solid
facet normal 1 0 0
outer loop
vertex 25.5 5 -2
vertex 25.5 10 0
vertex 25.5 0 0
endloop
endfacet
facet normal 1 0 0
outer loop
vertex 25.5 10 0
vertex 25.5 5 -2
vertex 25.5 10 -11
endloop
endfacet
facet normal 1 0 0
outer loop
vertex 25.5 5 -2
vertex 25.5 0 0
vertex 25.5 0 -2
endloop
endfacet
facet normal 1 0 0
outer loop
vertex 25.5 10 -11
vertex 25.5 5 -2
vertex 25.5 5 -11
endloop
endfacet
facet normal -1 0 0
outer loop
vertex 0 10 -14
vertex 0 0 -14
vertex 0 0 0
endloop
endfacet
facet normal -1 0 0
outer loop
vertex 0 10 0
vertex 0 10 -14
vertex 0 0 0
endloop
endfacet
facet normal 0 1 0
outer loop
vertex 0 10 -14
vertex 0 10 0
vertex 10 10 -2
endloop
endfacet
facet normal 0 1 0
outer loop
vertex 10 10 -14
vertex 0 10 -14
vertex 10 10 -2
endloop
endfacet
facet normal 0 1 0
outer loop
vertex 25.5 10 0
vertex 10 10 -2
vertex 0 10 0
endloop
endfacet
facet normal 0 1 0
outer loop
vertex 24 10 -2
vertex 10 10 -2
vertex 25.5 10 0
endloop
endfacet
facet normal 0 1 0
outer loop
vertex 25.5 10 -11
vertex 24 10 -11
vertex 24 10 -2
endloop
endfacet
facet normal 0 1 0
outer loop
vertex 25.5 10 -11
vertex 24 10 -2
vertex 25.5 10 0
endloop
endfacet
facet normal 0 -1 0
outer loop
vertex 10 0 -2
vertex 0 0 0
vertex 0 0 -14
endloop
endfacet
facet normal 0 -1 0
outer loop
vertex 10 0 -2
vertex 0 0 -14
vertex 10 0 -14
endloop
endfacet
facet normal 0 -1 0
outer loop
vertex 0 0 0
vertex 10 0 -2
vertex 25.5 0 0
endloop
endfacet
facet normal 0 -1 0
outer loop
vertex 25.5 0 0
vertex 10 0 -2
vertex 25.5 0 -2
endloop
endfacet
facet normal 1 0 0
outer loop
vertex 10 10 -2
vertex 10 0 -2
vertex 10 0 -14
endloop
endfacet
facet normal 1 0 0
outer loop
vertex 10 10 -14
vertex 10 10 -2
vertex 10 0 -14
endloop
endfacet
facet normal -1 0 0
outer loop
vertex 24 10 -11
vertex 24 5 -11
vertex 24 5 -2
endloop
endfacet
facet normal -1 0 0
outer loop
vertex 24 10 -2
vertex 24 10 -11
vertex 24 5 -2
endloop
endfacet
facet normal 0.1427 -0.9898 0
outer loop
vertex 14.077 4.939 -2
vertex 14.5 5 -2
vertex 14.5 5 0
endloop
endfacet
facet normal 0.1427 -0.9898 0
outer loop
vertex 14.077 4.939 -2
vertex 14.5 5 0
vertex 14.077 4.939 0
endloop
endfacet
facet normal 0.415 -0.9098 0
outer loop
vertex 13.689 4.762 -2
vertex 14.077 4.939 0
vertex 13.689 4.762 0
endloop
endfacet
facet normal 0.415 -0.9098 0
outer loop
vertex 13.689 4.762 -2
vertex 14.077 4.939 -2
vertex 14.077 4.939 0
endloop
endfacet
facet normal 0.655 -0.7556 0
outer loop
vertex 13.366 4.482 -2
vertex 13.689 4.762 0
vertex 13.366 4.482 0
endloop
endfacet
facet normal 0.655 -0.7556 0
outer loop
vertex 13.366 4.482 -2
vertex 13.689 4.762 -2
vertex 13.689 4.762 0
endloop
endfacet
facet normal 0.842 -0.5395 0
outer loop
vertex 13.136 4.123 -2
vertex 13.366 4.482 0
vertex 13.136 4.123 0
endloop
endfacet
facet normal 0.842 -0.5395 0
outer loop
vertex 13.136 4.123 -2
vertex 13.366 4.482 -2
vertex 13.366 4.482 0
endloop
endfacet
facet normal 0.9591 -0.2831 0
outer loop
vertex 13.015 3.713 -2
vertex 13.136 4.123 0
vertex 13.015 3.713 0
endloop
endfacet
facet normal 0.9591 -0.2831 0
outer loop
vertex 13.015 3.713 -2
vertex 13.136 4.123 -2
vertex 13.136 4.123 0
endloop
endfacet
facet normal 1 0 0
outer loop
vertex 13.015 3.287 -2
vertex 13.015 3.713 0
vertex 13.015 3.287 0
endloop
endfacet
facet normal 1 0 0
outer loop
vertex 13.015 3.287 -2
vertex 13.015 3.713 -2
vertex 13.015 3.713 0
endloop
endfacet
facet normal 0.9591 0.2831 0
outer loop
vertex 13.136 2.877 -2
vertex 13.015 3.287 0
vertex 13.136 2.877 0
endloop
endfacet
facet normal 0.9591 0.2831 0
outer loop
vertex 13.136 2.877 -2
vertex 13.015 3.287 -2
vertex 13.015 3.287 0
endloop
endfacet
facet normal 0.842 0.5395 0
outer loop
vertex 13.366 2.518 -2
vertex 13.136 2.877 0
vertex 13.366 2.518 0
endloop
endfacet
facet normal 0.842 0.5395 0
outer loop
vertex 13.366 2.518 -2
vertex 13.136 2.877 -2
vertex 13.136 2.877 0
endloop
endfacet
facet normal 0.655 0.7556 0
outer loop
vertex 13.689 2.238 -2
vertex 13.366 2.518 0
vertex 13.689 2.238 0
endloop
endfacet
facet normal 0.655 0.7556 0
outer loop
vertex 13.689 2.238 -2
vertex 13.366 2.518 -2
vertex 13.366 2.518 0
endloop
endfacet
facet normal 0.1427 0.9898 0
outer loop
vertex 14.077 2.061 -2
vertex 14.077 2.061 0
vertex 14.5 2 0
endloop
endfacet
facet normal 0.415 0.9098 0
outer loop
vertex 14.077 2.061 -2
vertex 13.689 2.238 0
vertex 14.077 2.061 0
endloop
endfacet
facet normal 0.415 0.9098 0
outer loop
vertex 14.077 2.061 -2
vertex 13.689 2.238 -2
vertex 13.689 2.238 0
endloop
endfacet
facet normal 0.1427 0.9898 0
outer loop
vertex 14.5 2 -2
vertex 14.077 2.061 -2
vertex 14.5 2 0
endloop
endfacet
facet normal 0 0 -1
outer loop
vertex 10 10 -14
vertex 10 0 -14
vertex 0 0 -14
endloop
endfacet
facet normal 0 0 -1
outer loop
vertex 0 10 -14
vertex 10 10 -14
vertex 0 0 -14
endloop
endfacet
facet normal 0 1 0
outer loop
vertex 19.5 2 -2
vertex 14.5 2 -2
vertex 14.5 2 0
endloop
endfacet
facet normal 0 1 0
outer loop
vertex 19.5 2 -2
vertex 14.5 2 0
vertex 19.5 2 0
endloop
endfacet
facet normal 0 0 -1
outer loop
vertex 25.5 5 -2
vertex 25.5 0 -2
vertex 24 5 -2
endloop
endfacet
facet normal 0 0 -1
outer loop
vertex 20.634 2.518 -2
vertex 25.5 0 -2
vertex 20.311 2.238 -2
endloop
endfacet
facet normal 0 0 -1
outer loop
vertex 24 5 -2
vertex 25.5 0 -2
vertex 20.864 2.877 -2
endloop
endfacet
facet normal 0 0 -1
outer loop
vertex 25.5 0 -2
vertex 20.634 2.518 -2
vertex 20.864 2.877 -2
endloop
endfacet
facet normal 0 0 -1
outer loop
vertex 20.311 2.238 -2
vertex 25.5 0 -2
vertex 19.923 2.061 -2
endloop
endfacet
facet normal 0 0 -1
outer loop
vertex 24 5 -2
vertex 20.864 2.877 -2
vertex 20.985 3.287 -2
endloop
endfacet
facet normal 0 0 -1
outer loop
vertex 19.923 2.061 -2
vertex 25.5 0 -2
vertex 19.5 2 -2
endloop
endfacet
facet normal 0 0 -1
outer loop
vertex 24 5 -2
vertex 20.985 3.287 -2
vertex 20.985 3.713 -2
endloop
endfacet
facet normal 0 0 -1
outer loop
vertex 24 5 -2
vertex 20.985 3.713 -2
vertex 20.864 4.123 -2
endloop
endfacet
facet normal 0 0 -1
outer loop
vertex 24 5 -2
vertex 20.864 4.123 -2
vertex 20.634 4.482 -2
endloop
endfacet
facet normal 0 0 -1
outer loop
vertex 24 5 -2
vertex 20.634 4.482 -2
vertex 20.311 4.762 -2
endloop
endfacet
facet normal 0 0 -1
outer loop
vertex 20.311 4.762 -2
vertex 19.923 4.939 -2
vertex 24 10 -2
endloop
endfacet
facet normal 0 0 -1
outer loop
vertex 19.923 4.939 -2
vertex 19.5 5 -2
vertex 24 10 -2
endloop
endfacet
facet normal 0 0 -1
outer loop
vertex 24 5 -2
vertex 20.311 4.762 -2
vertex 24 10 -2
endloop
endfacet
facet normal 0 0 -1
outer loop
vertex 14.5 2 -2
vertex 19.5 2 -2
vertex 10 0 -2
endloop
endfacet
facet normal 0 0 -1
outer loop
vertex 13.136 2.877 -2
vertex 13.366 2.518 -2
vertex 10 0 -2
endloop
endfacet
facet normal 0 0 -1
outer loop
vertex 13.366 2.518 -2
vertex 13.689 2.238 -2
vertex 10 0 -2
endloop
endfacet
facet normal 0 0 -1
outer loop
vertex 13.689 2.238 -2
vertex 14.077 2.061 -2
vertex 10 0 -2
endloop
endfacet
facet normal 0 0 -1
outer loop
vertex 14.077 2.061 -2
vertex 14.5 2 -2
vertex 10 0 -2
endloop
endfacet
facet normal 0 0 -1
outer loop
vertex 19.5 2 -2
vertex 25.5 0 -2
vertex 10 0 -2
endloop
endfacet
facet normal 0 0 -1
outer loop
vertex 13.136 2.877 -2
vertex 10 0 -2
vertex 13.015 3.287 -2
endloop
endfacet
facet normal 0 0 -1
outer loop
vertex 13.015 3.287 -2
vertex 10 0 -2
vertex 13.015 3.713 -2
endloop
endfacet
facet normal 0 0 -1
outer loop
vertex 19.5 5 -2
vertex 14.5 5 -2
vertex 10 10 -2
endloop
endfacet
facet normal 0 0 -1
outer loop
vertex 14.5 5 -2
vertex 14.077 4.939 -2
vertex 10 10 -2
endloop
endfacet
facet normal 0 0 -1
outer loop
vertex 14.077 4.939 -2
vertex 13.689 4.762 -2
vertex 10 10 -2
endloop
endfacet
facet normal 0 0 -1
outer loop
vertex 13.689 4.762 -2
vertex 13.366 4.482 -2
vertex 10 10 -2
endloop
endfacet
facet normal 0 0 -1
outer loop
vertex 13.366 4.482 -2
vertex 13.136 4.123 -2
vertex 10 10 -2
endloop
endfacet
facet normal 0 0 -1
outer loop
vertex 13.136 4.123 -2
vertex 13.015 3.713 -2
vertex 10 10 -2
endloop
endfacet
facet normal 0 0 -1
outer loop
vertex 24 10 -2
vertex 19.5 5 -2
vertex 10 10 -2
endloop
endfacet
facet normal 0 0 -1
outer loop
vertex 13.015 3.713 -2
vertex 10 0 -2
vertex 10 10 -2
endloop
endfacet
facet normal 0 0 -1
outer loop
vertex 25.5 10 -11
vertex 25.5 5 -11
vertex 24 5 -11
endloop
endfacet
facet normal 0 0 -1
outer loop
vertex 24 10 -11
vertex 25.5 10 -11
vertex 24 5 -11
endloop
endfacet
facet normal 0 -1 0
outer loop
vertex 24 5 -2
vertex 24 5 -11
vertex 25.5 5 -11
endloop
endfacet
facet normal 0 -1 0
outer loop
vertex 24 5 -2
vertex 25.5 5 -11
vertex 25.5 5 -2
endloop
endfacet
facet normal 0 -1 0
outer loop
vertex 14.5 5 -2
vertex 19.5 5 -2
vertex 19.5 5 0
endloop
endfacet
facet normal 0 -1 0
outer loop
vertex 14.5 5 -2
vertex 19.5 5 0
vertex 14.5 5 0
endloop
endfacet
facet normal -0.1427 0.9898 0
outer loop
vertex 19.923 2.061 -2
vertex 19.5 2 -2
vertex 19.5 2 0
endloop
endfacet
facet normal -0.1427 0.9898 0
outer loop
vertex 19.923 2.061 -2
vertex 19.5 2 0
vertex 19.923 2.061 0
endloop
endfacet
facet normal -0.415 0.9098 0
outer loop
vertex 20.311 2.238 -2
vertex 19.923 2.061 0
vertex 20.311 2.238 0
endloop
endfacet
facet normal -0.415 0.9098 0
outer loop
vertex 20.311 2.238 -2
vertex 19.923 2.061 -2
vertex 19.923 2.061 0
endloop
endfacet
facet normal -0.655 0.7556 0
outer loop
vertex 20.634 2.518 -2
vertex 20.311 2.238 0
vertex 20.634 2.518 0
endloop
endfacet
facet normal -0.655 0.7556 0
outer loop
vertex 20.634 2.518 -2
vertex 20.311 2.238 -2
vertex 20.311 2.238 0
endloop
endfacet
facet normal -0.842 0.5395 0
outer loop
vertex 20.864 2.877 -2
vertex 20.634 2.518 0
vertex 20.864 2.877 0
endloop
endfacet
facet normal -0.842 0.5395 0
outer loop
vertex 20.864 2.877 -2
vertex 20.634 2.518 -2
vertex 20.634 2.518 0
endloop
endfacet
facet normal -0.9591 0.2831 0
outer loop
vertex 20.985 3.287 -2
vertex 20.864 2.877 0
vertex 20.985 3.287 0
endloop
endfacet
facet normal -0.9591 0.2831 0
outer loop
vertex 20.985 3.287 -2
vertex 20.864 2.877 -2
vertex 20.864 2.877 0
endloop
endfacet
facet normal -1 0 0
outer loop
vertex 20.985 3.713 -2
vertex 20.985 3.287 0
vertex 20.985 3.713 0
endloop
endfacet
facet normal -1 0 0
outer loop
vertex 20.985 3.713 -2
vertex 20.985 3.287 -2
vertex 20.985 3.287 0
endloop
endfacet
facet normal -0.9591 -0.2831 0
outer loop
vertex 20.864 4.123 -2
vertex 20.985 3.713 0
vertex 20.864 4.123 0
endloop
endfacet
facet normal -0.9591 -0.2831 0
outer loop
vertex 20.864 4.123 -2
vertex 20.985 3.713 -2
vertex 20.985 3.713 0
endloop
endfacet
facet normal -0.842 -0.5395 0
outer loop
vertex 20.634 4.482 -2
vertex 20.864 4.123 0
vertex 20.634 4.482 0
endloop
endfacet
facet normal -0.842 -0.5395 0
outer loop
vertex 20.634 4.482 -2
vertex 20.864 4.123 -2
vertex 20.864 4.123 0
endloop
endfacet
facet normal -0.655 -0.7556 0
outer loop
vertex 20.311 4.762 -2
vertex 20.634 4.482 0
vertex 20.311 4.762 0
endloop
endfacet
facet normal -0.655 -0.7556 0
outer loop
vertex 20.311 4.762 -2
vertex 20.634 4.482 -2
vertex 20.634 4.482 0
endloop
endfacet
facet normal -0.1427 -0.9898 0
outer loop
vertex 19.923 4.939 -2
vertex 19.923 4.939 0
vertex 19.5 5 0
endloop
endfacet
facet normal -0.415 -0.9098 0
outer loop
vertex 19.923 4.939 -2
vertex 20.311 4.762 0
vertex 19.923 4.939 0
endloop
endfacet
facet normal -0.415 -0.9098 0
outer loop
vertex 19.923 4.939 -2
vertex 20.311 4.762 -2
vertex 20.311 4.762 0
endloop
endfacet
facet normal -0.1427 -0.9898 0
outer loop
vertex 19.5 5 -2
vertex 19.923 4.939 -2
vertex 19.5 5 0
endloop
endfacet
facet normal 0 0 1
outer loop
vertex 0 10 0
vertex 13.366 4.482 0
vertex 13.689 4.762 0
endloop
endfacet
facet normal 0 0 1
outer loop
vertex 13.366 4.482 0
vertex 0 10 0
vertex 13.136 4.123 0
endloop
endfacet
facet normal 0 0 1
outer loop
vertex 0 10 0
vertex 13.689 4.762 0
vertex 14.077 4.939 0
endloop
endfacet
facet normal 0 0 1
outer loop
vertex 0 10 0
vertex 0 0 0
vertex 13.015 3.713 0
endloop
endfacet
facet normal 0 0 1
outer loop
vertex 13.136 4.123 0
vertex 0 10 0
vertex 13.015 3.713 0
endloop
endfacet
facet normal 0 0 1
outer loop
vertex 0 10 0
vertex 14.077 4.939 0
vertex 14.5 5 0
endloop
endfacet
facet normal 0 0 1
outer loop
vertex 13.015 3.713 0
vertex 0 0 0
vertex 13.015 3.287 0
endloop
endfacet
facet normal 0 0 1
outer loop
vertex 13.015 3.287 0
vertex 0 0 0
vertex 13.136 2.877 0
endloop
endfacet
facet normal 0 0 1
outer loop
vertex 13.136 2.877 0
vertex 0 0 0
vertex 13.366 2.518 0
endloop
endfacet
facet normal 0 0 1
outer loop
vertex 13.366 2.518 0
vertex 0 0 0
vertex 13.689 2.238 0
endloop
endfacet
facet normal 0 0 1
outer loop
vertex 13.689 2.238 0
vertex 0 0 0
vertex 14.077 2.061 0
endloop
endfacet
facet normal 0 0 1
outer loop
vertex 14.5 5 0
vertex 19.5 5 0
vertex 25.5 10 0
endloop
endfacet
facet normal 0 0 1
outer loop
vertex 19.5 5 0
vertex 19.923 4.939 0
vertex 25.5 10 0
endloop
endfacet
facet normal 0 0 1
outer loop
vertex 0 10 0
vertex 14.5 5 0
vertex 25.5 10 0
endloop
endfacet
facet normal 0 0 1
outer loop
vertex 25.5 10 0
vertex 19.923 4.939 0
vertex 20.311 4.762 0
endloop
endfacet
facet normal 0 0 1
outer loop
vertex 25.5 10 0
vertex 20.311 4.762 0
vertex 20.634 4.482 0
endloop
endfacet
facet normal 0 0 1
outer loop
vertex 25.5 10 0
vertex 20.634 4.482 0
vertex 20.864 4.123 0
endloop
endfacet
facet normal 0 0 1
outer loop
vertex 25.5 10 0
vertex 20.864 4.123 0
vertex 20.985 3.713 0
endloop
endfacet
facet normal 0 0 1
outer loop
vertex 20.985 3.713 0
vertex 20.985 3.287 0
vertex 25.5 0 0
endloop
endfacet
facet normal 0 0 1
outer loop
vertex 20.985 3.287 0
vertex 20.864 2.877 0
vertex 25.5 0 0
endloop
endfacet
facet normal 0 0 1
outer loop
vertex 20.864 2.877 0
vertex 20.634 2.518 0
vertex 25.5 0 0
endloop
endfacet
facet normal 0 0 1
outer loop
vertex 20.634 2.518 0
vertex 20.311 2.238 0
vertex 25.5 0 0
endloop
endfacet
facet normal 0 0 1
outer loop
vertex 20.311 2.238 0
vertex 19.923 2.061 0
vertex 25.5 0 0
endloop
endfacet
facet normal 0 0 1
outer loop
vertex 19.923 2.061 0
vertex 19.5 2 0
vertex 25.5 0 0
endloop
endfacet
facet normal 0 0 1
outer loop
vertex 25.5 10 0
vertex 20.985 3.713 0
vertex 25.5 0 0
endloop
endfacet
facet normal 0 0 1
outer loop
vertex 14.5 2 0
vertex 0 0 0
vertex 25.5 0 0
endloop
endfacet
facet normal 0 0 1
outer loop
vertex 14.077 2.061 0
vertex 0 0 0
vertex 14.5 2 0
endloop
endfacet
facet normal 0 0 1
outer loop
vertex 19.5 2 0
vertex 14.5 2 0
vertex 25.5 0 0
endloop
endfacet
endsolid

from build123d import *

# Parameters (mm, degrees)
BOSS_EXTRUDE1_DEPTH = 10
CUT_EXTRUDE1_REACH  = 3.5
SKETCH2_W           = 9
SKETCH2_H           = 5
CUT_EXTRUDE2_REACH  = 4


with BuildPart() as part:
    # Sketch1 → Boss-Extrude1 (new body)
    with BuildSketch(Plane(origin=(0, 0, 0), x_dir=(1, 0, 0), z_dir=(0, 1, 0))):
        Polygon((0, 0), (25.5, 0), (25.5, 11), (24, 11), (24, 2), (10, 2), (10, 14), (0, 14), align=None)
    extrude(amount=BOSS_EXTRUDE1_DEPTH)

    # Sketch2 → Cut-Extrude1 (cut, up to next)
    with BuildSketch(Plane.ZY.offset(-24), mode=Mode.PRIVATE) as cut_extrude1_sk1:
        with Locations((-6.5, 2.5)):
            Rectangle(SKETCH2_W, SKETCH2_H)
    cut_extrude1_tool1 = extrude(cut_extrude1_sk1.sketch, amount=-CUT_EXTRUDE1_REACH, mode=Mode.PRIVATE) & part.part
    add(cut_extrude1_tool1.solids().sort_by_distance((24, 2.5, -6.5))[0], mode=Mode.SUBTRACT)

    # Sketch3 → Cut-Extrude2 (cut, up to next)
    with BuildSketch(Plane(origin=(0, 0, -2), x_dir=(-1, 0, 0), z_dir=(0, 0, -1)), mode=Mode.PRIVATE) as cut_extrude2_sk1:
        with BuildLine():
            Line((-19.5, 5), (-14.5, 5))
            ThreePointArc((-14.5, 5), (-13, 3.5), (-14.5, 2))
            Line((-14.5, 2), (-19.5, 2))
            ThreePointArc((-19.5, 2), (-21, 3.5), (-19.5, 5))
        make_face()
    cut_extrude2_tool1 = extrude(cut_extrude2_sk1.sketch, amount=-CUT_EXTRUDE2_REACH, mode=Mode.PRIVATE) & part.part
    add(cut_extrude2_tool1.solids().sort_by_distance((17, 3.5, -2))[0], mode=Mode.SUBTRACT)


solid = part.part
